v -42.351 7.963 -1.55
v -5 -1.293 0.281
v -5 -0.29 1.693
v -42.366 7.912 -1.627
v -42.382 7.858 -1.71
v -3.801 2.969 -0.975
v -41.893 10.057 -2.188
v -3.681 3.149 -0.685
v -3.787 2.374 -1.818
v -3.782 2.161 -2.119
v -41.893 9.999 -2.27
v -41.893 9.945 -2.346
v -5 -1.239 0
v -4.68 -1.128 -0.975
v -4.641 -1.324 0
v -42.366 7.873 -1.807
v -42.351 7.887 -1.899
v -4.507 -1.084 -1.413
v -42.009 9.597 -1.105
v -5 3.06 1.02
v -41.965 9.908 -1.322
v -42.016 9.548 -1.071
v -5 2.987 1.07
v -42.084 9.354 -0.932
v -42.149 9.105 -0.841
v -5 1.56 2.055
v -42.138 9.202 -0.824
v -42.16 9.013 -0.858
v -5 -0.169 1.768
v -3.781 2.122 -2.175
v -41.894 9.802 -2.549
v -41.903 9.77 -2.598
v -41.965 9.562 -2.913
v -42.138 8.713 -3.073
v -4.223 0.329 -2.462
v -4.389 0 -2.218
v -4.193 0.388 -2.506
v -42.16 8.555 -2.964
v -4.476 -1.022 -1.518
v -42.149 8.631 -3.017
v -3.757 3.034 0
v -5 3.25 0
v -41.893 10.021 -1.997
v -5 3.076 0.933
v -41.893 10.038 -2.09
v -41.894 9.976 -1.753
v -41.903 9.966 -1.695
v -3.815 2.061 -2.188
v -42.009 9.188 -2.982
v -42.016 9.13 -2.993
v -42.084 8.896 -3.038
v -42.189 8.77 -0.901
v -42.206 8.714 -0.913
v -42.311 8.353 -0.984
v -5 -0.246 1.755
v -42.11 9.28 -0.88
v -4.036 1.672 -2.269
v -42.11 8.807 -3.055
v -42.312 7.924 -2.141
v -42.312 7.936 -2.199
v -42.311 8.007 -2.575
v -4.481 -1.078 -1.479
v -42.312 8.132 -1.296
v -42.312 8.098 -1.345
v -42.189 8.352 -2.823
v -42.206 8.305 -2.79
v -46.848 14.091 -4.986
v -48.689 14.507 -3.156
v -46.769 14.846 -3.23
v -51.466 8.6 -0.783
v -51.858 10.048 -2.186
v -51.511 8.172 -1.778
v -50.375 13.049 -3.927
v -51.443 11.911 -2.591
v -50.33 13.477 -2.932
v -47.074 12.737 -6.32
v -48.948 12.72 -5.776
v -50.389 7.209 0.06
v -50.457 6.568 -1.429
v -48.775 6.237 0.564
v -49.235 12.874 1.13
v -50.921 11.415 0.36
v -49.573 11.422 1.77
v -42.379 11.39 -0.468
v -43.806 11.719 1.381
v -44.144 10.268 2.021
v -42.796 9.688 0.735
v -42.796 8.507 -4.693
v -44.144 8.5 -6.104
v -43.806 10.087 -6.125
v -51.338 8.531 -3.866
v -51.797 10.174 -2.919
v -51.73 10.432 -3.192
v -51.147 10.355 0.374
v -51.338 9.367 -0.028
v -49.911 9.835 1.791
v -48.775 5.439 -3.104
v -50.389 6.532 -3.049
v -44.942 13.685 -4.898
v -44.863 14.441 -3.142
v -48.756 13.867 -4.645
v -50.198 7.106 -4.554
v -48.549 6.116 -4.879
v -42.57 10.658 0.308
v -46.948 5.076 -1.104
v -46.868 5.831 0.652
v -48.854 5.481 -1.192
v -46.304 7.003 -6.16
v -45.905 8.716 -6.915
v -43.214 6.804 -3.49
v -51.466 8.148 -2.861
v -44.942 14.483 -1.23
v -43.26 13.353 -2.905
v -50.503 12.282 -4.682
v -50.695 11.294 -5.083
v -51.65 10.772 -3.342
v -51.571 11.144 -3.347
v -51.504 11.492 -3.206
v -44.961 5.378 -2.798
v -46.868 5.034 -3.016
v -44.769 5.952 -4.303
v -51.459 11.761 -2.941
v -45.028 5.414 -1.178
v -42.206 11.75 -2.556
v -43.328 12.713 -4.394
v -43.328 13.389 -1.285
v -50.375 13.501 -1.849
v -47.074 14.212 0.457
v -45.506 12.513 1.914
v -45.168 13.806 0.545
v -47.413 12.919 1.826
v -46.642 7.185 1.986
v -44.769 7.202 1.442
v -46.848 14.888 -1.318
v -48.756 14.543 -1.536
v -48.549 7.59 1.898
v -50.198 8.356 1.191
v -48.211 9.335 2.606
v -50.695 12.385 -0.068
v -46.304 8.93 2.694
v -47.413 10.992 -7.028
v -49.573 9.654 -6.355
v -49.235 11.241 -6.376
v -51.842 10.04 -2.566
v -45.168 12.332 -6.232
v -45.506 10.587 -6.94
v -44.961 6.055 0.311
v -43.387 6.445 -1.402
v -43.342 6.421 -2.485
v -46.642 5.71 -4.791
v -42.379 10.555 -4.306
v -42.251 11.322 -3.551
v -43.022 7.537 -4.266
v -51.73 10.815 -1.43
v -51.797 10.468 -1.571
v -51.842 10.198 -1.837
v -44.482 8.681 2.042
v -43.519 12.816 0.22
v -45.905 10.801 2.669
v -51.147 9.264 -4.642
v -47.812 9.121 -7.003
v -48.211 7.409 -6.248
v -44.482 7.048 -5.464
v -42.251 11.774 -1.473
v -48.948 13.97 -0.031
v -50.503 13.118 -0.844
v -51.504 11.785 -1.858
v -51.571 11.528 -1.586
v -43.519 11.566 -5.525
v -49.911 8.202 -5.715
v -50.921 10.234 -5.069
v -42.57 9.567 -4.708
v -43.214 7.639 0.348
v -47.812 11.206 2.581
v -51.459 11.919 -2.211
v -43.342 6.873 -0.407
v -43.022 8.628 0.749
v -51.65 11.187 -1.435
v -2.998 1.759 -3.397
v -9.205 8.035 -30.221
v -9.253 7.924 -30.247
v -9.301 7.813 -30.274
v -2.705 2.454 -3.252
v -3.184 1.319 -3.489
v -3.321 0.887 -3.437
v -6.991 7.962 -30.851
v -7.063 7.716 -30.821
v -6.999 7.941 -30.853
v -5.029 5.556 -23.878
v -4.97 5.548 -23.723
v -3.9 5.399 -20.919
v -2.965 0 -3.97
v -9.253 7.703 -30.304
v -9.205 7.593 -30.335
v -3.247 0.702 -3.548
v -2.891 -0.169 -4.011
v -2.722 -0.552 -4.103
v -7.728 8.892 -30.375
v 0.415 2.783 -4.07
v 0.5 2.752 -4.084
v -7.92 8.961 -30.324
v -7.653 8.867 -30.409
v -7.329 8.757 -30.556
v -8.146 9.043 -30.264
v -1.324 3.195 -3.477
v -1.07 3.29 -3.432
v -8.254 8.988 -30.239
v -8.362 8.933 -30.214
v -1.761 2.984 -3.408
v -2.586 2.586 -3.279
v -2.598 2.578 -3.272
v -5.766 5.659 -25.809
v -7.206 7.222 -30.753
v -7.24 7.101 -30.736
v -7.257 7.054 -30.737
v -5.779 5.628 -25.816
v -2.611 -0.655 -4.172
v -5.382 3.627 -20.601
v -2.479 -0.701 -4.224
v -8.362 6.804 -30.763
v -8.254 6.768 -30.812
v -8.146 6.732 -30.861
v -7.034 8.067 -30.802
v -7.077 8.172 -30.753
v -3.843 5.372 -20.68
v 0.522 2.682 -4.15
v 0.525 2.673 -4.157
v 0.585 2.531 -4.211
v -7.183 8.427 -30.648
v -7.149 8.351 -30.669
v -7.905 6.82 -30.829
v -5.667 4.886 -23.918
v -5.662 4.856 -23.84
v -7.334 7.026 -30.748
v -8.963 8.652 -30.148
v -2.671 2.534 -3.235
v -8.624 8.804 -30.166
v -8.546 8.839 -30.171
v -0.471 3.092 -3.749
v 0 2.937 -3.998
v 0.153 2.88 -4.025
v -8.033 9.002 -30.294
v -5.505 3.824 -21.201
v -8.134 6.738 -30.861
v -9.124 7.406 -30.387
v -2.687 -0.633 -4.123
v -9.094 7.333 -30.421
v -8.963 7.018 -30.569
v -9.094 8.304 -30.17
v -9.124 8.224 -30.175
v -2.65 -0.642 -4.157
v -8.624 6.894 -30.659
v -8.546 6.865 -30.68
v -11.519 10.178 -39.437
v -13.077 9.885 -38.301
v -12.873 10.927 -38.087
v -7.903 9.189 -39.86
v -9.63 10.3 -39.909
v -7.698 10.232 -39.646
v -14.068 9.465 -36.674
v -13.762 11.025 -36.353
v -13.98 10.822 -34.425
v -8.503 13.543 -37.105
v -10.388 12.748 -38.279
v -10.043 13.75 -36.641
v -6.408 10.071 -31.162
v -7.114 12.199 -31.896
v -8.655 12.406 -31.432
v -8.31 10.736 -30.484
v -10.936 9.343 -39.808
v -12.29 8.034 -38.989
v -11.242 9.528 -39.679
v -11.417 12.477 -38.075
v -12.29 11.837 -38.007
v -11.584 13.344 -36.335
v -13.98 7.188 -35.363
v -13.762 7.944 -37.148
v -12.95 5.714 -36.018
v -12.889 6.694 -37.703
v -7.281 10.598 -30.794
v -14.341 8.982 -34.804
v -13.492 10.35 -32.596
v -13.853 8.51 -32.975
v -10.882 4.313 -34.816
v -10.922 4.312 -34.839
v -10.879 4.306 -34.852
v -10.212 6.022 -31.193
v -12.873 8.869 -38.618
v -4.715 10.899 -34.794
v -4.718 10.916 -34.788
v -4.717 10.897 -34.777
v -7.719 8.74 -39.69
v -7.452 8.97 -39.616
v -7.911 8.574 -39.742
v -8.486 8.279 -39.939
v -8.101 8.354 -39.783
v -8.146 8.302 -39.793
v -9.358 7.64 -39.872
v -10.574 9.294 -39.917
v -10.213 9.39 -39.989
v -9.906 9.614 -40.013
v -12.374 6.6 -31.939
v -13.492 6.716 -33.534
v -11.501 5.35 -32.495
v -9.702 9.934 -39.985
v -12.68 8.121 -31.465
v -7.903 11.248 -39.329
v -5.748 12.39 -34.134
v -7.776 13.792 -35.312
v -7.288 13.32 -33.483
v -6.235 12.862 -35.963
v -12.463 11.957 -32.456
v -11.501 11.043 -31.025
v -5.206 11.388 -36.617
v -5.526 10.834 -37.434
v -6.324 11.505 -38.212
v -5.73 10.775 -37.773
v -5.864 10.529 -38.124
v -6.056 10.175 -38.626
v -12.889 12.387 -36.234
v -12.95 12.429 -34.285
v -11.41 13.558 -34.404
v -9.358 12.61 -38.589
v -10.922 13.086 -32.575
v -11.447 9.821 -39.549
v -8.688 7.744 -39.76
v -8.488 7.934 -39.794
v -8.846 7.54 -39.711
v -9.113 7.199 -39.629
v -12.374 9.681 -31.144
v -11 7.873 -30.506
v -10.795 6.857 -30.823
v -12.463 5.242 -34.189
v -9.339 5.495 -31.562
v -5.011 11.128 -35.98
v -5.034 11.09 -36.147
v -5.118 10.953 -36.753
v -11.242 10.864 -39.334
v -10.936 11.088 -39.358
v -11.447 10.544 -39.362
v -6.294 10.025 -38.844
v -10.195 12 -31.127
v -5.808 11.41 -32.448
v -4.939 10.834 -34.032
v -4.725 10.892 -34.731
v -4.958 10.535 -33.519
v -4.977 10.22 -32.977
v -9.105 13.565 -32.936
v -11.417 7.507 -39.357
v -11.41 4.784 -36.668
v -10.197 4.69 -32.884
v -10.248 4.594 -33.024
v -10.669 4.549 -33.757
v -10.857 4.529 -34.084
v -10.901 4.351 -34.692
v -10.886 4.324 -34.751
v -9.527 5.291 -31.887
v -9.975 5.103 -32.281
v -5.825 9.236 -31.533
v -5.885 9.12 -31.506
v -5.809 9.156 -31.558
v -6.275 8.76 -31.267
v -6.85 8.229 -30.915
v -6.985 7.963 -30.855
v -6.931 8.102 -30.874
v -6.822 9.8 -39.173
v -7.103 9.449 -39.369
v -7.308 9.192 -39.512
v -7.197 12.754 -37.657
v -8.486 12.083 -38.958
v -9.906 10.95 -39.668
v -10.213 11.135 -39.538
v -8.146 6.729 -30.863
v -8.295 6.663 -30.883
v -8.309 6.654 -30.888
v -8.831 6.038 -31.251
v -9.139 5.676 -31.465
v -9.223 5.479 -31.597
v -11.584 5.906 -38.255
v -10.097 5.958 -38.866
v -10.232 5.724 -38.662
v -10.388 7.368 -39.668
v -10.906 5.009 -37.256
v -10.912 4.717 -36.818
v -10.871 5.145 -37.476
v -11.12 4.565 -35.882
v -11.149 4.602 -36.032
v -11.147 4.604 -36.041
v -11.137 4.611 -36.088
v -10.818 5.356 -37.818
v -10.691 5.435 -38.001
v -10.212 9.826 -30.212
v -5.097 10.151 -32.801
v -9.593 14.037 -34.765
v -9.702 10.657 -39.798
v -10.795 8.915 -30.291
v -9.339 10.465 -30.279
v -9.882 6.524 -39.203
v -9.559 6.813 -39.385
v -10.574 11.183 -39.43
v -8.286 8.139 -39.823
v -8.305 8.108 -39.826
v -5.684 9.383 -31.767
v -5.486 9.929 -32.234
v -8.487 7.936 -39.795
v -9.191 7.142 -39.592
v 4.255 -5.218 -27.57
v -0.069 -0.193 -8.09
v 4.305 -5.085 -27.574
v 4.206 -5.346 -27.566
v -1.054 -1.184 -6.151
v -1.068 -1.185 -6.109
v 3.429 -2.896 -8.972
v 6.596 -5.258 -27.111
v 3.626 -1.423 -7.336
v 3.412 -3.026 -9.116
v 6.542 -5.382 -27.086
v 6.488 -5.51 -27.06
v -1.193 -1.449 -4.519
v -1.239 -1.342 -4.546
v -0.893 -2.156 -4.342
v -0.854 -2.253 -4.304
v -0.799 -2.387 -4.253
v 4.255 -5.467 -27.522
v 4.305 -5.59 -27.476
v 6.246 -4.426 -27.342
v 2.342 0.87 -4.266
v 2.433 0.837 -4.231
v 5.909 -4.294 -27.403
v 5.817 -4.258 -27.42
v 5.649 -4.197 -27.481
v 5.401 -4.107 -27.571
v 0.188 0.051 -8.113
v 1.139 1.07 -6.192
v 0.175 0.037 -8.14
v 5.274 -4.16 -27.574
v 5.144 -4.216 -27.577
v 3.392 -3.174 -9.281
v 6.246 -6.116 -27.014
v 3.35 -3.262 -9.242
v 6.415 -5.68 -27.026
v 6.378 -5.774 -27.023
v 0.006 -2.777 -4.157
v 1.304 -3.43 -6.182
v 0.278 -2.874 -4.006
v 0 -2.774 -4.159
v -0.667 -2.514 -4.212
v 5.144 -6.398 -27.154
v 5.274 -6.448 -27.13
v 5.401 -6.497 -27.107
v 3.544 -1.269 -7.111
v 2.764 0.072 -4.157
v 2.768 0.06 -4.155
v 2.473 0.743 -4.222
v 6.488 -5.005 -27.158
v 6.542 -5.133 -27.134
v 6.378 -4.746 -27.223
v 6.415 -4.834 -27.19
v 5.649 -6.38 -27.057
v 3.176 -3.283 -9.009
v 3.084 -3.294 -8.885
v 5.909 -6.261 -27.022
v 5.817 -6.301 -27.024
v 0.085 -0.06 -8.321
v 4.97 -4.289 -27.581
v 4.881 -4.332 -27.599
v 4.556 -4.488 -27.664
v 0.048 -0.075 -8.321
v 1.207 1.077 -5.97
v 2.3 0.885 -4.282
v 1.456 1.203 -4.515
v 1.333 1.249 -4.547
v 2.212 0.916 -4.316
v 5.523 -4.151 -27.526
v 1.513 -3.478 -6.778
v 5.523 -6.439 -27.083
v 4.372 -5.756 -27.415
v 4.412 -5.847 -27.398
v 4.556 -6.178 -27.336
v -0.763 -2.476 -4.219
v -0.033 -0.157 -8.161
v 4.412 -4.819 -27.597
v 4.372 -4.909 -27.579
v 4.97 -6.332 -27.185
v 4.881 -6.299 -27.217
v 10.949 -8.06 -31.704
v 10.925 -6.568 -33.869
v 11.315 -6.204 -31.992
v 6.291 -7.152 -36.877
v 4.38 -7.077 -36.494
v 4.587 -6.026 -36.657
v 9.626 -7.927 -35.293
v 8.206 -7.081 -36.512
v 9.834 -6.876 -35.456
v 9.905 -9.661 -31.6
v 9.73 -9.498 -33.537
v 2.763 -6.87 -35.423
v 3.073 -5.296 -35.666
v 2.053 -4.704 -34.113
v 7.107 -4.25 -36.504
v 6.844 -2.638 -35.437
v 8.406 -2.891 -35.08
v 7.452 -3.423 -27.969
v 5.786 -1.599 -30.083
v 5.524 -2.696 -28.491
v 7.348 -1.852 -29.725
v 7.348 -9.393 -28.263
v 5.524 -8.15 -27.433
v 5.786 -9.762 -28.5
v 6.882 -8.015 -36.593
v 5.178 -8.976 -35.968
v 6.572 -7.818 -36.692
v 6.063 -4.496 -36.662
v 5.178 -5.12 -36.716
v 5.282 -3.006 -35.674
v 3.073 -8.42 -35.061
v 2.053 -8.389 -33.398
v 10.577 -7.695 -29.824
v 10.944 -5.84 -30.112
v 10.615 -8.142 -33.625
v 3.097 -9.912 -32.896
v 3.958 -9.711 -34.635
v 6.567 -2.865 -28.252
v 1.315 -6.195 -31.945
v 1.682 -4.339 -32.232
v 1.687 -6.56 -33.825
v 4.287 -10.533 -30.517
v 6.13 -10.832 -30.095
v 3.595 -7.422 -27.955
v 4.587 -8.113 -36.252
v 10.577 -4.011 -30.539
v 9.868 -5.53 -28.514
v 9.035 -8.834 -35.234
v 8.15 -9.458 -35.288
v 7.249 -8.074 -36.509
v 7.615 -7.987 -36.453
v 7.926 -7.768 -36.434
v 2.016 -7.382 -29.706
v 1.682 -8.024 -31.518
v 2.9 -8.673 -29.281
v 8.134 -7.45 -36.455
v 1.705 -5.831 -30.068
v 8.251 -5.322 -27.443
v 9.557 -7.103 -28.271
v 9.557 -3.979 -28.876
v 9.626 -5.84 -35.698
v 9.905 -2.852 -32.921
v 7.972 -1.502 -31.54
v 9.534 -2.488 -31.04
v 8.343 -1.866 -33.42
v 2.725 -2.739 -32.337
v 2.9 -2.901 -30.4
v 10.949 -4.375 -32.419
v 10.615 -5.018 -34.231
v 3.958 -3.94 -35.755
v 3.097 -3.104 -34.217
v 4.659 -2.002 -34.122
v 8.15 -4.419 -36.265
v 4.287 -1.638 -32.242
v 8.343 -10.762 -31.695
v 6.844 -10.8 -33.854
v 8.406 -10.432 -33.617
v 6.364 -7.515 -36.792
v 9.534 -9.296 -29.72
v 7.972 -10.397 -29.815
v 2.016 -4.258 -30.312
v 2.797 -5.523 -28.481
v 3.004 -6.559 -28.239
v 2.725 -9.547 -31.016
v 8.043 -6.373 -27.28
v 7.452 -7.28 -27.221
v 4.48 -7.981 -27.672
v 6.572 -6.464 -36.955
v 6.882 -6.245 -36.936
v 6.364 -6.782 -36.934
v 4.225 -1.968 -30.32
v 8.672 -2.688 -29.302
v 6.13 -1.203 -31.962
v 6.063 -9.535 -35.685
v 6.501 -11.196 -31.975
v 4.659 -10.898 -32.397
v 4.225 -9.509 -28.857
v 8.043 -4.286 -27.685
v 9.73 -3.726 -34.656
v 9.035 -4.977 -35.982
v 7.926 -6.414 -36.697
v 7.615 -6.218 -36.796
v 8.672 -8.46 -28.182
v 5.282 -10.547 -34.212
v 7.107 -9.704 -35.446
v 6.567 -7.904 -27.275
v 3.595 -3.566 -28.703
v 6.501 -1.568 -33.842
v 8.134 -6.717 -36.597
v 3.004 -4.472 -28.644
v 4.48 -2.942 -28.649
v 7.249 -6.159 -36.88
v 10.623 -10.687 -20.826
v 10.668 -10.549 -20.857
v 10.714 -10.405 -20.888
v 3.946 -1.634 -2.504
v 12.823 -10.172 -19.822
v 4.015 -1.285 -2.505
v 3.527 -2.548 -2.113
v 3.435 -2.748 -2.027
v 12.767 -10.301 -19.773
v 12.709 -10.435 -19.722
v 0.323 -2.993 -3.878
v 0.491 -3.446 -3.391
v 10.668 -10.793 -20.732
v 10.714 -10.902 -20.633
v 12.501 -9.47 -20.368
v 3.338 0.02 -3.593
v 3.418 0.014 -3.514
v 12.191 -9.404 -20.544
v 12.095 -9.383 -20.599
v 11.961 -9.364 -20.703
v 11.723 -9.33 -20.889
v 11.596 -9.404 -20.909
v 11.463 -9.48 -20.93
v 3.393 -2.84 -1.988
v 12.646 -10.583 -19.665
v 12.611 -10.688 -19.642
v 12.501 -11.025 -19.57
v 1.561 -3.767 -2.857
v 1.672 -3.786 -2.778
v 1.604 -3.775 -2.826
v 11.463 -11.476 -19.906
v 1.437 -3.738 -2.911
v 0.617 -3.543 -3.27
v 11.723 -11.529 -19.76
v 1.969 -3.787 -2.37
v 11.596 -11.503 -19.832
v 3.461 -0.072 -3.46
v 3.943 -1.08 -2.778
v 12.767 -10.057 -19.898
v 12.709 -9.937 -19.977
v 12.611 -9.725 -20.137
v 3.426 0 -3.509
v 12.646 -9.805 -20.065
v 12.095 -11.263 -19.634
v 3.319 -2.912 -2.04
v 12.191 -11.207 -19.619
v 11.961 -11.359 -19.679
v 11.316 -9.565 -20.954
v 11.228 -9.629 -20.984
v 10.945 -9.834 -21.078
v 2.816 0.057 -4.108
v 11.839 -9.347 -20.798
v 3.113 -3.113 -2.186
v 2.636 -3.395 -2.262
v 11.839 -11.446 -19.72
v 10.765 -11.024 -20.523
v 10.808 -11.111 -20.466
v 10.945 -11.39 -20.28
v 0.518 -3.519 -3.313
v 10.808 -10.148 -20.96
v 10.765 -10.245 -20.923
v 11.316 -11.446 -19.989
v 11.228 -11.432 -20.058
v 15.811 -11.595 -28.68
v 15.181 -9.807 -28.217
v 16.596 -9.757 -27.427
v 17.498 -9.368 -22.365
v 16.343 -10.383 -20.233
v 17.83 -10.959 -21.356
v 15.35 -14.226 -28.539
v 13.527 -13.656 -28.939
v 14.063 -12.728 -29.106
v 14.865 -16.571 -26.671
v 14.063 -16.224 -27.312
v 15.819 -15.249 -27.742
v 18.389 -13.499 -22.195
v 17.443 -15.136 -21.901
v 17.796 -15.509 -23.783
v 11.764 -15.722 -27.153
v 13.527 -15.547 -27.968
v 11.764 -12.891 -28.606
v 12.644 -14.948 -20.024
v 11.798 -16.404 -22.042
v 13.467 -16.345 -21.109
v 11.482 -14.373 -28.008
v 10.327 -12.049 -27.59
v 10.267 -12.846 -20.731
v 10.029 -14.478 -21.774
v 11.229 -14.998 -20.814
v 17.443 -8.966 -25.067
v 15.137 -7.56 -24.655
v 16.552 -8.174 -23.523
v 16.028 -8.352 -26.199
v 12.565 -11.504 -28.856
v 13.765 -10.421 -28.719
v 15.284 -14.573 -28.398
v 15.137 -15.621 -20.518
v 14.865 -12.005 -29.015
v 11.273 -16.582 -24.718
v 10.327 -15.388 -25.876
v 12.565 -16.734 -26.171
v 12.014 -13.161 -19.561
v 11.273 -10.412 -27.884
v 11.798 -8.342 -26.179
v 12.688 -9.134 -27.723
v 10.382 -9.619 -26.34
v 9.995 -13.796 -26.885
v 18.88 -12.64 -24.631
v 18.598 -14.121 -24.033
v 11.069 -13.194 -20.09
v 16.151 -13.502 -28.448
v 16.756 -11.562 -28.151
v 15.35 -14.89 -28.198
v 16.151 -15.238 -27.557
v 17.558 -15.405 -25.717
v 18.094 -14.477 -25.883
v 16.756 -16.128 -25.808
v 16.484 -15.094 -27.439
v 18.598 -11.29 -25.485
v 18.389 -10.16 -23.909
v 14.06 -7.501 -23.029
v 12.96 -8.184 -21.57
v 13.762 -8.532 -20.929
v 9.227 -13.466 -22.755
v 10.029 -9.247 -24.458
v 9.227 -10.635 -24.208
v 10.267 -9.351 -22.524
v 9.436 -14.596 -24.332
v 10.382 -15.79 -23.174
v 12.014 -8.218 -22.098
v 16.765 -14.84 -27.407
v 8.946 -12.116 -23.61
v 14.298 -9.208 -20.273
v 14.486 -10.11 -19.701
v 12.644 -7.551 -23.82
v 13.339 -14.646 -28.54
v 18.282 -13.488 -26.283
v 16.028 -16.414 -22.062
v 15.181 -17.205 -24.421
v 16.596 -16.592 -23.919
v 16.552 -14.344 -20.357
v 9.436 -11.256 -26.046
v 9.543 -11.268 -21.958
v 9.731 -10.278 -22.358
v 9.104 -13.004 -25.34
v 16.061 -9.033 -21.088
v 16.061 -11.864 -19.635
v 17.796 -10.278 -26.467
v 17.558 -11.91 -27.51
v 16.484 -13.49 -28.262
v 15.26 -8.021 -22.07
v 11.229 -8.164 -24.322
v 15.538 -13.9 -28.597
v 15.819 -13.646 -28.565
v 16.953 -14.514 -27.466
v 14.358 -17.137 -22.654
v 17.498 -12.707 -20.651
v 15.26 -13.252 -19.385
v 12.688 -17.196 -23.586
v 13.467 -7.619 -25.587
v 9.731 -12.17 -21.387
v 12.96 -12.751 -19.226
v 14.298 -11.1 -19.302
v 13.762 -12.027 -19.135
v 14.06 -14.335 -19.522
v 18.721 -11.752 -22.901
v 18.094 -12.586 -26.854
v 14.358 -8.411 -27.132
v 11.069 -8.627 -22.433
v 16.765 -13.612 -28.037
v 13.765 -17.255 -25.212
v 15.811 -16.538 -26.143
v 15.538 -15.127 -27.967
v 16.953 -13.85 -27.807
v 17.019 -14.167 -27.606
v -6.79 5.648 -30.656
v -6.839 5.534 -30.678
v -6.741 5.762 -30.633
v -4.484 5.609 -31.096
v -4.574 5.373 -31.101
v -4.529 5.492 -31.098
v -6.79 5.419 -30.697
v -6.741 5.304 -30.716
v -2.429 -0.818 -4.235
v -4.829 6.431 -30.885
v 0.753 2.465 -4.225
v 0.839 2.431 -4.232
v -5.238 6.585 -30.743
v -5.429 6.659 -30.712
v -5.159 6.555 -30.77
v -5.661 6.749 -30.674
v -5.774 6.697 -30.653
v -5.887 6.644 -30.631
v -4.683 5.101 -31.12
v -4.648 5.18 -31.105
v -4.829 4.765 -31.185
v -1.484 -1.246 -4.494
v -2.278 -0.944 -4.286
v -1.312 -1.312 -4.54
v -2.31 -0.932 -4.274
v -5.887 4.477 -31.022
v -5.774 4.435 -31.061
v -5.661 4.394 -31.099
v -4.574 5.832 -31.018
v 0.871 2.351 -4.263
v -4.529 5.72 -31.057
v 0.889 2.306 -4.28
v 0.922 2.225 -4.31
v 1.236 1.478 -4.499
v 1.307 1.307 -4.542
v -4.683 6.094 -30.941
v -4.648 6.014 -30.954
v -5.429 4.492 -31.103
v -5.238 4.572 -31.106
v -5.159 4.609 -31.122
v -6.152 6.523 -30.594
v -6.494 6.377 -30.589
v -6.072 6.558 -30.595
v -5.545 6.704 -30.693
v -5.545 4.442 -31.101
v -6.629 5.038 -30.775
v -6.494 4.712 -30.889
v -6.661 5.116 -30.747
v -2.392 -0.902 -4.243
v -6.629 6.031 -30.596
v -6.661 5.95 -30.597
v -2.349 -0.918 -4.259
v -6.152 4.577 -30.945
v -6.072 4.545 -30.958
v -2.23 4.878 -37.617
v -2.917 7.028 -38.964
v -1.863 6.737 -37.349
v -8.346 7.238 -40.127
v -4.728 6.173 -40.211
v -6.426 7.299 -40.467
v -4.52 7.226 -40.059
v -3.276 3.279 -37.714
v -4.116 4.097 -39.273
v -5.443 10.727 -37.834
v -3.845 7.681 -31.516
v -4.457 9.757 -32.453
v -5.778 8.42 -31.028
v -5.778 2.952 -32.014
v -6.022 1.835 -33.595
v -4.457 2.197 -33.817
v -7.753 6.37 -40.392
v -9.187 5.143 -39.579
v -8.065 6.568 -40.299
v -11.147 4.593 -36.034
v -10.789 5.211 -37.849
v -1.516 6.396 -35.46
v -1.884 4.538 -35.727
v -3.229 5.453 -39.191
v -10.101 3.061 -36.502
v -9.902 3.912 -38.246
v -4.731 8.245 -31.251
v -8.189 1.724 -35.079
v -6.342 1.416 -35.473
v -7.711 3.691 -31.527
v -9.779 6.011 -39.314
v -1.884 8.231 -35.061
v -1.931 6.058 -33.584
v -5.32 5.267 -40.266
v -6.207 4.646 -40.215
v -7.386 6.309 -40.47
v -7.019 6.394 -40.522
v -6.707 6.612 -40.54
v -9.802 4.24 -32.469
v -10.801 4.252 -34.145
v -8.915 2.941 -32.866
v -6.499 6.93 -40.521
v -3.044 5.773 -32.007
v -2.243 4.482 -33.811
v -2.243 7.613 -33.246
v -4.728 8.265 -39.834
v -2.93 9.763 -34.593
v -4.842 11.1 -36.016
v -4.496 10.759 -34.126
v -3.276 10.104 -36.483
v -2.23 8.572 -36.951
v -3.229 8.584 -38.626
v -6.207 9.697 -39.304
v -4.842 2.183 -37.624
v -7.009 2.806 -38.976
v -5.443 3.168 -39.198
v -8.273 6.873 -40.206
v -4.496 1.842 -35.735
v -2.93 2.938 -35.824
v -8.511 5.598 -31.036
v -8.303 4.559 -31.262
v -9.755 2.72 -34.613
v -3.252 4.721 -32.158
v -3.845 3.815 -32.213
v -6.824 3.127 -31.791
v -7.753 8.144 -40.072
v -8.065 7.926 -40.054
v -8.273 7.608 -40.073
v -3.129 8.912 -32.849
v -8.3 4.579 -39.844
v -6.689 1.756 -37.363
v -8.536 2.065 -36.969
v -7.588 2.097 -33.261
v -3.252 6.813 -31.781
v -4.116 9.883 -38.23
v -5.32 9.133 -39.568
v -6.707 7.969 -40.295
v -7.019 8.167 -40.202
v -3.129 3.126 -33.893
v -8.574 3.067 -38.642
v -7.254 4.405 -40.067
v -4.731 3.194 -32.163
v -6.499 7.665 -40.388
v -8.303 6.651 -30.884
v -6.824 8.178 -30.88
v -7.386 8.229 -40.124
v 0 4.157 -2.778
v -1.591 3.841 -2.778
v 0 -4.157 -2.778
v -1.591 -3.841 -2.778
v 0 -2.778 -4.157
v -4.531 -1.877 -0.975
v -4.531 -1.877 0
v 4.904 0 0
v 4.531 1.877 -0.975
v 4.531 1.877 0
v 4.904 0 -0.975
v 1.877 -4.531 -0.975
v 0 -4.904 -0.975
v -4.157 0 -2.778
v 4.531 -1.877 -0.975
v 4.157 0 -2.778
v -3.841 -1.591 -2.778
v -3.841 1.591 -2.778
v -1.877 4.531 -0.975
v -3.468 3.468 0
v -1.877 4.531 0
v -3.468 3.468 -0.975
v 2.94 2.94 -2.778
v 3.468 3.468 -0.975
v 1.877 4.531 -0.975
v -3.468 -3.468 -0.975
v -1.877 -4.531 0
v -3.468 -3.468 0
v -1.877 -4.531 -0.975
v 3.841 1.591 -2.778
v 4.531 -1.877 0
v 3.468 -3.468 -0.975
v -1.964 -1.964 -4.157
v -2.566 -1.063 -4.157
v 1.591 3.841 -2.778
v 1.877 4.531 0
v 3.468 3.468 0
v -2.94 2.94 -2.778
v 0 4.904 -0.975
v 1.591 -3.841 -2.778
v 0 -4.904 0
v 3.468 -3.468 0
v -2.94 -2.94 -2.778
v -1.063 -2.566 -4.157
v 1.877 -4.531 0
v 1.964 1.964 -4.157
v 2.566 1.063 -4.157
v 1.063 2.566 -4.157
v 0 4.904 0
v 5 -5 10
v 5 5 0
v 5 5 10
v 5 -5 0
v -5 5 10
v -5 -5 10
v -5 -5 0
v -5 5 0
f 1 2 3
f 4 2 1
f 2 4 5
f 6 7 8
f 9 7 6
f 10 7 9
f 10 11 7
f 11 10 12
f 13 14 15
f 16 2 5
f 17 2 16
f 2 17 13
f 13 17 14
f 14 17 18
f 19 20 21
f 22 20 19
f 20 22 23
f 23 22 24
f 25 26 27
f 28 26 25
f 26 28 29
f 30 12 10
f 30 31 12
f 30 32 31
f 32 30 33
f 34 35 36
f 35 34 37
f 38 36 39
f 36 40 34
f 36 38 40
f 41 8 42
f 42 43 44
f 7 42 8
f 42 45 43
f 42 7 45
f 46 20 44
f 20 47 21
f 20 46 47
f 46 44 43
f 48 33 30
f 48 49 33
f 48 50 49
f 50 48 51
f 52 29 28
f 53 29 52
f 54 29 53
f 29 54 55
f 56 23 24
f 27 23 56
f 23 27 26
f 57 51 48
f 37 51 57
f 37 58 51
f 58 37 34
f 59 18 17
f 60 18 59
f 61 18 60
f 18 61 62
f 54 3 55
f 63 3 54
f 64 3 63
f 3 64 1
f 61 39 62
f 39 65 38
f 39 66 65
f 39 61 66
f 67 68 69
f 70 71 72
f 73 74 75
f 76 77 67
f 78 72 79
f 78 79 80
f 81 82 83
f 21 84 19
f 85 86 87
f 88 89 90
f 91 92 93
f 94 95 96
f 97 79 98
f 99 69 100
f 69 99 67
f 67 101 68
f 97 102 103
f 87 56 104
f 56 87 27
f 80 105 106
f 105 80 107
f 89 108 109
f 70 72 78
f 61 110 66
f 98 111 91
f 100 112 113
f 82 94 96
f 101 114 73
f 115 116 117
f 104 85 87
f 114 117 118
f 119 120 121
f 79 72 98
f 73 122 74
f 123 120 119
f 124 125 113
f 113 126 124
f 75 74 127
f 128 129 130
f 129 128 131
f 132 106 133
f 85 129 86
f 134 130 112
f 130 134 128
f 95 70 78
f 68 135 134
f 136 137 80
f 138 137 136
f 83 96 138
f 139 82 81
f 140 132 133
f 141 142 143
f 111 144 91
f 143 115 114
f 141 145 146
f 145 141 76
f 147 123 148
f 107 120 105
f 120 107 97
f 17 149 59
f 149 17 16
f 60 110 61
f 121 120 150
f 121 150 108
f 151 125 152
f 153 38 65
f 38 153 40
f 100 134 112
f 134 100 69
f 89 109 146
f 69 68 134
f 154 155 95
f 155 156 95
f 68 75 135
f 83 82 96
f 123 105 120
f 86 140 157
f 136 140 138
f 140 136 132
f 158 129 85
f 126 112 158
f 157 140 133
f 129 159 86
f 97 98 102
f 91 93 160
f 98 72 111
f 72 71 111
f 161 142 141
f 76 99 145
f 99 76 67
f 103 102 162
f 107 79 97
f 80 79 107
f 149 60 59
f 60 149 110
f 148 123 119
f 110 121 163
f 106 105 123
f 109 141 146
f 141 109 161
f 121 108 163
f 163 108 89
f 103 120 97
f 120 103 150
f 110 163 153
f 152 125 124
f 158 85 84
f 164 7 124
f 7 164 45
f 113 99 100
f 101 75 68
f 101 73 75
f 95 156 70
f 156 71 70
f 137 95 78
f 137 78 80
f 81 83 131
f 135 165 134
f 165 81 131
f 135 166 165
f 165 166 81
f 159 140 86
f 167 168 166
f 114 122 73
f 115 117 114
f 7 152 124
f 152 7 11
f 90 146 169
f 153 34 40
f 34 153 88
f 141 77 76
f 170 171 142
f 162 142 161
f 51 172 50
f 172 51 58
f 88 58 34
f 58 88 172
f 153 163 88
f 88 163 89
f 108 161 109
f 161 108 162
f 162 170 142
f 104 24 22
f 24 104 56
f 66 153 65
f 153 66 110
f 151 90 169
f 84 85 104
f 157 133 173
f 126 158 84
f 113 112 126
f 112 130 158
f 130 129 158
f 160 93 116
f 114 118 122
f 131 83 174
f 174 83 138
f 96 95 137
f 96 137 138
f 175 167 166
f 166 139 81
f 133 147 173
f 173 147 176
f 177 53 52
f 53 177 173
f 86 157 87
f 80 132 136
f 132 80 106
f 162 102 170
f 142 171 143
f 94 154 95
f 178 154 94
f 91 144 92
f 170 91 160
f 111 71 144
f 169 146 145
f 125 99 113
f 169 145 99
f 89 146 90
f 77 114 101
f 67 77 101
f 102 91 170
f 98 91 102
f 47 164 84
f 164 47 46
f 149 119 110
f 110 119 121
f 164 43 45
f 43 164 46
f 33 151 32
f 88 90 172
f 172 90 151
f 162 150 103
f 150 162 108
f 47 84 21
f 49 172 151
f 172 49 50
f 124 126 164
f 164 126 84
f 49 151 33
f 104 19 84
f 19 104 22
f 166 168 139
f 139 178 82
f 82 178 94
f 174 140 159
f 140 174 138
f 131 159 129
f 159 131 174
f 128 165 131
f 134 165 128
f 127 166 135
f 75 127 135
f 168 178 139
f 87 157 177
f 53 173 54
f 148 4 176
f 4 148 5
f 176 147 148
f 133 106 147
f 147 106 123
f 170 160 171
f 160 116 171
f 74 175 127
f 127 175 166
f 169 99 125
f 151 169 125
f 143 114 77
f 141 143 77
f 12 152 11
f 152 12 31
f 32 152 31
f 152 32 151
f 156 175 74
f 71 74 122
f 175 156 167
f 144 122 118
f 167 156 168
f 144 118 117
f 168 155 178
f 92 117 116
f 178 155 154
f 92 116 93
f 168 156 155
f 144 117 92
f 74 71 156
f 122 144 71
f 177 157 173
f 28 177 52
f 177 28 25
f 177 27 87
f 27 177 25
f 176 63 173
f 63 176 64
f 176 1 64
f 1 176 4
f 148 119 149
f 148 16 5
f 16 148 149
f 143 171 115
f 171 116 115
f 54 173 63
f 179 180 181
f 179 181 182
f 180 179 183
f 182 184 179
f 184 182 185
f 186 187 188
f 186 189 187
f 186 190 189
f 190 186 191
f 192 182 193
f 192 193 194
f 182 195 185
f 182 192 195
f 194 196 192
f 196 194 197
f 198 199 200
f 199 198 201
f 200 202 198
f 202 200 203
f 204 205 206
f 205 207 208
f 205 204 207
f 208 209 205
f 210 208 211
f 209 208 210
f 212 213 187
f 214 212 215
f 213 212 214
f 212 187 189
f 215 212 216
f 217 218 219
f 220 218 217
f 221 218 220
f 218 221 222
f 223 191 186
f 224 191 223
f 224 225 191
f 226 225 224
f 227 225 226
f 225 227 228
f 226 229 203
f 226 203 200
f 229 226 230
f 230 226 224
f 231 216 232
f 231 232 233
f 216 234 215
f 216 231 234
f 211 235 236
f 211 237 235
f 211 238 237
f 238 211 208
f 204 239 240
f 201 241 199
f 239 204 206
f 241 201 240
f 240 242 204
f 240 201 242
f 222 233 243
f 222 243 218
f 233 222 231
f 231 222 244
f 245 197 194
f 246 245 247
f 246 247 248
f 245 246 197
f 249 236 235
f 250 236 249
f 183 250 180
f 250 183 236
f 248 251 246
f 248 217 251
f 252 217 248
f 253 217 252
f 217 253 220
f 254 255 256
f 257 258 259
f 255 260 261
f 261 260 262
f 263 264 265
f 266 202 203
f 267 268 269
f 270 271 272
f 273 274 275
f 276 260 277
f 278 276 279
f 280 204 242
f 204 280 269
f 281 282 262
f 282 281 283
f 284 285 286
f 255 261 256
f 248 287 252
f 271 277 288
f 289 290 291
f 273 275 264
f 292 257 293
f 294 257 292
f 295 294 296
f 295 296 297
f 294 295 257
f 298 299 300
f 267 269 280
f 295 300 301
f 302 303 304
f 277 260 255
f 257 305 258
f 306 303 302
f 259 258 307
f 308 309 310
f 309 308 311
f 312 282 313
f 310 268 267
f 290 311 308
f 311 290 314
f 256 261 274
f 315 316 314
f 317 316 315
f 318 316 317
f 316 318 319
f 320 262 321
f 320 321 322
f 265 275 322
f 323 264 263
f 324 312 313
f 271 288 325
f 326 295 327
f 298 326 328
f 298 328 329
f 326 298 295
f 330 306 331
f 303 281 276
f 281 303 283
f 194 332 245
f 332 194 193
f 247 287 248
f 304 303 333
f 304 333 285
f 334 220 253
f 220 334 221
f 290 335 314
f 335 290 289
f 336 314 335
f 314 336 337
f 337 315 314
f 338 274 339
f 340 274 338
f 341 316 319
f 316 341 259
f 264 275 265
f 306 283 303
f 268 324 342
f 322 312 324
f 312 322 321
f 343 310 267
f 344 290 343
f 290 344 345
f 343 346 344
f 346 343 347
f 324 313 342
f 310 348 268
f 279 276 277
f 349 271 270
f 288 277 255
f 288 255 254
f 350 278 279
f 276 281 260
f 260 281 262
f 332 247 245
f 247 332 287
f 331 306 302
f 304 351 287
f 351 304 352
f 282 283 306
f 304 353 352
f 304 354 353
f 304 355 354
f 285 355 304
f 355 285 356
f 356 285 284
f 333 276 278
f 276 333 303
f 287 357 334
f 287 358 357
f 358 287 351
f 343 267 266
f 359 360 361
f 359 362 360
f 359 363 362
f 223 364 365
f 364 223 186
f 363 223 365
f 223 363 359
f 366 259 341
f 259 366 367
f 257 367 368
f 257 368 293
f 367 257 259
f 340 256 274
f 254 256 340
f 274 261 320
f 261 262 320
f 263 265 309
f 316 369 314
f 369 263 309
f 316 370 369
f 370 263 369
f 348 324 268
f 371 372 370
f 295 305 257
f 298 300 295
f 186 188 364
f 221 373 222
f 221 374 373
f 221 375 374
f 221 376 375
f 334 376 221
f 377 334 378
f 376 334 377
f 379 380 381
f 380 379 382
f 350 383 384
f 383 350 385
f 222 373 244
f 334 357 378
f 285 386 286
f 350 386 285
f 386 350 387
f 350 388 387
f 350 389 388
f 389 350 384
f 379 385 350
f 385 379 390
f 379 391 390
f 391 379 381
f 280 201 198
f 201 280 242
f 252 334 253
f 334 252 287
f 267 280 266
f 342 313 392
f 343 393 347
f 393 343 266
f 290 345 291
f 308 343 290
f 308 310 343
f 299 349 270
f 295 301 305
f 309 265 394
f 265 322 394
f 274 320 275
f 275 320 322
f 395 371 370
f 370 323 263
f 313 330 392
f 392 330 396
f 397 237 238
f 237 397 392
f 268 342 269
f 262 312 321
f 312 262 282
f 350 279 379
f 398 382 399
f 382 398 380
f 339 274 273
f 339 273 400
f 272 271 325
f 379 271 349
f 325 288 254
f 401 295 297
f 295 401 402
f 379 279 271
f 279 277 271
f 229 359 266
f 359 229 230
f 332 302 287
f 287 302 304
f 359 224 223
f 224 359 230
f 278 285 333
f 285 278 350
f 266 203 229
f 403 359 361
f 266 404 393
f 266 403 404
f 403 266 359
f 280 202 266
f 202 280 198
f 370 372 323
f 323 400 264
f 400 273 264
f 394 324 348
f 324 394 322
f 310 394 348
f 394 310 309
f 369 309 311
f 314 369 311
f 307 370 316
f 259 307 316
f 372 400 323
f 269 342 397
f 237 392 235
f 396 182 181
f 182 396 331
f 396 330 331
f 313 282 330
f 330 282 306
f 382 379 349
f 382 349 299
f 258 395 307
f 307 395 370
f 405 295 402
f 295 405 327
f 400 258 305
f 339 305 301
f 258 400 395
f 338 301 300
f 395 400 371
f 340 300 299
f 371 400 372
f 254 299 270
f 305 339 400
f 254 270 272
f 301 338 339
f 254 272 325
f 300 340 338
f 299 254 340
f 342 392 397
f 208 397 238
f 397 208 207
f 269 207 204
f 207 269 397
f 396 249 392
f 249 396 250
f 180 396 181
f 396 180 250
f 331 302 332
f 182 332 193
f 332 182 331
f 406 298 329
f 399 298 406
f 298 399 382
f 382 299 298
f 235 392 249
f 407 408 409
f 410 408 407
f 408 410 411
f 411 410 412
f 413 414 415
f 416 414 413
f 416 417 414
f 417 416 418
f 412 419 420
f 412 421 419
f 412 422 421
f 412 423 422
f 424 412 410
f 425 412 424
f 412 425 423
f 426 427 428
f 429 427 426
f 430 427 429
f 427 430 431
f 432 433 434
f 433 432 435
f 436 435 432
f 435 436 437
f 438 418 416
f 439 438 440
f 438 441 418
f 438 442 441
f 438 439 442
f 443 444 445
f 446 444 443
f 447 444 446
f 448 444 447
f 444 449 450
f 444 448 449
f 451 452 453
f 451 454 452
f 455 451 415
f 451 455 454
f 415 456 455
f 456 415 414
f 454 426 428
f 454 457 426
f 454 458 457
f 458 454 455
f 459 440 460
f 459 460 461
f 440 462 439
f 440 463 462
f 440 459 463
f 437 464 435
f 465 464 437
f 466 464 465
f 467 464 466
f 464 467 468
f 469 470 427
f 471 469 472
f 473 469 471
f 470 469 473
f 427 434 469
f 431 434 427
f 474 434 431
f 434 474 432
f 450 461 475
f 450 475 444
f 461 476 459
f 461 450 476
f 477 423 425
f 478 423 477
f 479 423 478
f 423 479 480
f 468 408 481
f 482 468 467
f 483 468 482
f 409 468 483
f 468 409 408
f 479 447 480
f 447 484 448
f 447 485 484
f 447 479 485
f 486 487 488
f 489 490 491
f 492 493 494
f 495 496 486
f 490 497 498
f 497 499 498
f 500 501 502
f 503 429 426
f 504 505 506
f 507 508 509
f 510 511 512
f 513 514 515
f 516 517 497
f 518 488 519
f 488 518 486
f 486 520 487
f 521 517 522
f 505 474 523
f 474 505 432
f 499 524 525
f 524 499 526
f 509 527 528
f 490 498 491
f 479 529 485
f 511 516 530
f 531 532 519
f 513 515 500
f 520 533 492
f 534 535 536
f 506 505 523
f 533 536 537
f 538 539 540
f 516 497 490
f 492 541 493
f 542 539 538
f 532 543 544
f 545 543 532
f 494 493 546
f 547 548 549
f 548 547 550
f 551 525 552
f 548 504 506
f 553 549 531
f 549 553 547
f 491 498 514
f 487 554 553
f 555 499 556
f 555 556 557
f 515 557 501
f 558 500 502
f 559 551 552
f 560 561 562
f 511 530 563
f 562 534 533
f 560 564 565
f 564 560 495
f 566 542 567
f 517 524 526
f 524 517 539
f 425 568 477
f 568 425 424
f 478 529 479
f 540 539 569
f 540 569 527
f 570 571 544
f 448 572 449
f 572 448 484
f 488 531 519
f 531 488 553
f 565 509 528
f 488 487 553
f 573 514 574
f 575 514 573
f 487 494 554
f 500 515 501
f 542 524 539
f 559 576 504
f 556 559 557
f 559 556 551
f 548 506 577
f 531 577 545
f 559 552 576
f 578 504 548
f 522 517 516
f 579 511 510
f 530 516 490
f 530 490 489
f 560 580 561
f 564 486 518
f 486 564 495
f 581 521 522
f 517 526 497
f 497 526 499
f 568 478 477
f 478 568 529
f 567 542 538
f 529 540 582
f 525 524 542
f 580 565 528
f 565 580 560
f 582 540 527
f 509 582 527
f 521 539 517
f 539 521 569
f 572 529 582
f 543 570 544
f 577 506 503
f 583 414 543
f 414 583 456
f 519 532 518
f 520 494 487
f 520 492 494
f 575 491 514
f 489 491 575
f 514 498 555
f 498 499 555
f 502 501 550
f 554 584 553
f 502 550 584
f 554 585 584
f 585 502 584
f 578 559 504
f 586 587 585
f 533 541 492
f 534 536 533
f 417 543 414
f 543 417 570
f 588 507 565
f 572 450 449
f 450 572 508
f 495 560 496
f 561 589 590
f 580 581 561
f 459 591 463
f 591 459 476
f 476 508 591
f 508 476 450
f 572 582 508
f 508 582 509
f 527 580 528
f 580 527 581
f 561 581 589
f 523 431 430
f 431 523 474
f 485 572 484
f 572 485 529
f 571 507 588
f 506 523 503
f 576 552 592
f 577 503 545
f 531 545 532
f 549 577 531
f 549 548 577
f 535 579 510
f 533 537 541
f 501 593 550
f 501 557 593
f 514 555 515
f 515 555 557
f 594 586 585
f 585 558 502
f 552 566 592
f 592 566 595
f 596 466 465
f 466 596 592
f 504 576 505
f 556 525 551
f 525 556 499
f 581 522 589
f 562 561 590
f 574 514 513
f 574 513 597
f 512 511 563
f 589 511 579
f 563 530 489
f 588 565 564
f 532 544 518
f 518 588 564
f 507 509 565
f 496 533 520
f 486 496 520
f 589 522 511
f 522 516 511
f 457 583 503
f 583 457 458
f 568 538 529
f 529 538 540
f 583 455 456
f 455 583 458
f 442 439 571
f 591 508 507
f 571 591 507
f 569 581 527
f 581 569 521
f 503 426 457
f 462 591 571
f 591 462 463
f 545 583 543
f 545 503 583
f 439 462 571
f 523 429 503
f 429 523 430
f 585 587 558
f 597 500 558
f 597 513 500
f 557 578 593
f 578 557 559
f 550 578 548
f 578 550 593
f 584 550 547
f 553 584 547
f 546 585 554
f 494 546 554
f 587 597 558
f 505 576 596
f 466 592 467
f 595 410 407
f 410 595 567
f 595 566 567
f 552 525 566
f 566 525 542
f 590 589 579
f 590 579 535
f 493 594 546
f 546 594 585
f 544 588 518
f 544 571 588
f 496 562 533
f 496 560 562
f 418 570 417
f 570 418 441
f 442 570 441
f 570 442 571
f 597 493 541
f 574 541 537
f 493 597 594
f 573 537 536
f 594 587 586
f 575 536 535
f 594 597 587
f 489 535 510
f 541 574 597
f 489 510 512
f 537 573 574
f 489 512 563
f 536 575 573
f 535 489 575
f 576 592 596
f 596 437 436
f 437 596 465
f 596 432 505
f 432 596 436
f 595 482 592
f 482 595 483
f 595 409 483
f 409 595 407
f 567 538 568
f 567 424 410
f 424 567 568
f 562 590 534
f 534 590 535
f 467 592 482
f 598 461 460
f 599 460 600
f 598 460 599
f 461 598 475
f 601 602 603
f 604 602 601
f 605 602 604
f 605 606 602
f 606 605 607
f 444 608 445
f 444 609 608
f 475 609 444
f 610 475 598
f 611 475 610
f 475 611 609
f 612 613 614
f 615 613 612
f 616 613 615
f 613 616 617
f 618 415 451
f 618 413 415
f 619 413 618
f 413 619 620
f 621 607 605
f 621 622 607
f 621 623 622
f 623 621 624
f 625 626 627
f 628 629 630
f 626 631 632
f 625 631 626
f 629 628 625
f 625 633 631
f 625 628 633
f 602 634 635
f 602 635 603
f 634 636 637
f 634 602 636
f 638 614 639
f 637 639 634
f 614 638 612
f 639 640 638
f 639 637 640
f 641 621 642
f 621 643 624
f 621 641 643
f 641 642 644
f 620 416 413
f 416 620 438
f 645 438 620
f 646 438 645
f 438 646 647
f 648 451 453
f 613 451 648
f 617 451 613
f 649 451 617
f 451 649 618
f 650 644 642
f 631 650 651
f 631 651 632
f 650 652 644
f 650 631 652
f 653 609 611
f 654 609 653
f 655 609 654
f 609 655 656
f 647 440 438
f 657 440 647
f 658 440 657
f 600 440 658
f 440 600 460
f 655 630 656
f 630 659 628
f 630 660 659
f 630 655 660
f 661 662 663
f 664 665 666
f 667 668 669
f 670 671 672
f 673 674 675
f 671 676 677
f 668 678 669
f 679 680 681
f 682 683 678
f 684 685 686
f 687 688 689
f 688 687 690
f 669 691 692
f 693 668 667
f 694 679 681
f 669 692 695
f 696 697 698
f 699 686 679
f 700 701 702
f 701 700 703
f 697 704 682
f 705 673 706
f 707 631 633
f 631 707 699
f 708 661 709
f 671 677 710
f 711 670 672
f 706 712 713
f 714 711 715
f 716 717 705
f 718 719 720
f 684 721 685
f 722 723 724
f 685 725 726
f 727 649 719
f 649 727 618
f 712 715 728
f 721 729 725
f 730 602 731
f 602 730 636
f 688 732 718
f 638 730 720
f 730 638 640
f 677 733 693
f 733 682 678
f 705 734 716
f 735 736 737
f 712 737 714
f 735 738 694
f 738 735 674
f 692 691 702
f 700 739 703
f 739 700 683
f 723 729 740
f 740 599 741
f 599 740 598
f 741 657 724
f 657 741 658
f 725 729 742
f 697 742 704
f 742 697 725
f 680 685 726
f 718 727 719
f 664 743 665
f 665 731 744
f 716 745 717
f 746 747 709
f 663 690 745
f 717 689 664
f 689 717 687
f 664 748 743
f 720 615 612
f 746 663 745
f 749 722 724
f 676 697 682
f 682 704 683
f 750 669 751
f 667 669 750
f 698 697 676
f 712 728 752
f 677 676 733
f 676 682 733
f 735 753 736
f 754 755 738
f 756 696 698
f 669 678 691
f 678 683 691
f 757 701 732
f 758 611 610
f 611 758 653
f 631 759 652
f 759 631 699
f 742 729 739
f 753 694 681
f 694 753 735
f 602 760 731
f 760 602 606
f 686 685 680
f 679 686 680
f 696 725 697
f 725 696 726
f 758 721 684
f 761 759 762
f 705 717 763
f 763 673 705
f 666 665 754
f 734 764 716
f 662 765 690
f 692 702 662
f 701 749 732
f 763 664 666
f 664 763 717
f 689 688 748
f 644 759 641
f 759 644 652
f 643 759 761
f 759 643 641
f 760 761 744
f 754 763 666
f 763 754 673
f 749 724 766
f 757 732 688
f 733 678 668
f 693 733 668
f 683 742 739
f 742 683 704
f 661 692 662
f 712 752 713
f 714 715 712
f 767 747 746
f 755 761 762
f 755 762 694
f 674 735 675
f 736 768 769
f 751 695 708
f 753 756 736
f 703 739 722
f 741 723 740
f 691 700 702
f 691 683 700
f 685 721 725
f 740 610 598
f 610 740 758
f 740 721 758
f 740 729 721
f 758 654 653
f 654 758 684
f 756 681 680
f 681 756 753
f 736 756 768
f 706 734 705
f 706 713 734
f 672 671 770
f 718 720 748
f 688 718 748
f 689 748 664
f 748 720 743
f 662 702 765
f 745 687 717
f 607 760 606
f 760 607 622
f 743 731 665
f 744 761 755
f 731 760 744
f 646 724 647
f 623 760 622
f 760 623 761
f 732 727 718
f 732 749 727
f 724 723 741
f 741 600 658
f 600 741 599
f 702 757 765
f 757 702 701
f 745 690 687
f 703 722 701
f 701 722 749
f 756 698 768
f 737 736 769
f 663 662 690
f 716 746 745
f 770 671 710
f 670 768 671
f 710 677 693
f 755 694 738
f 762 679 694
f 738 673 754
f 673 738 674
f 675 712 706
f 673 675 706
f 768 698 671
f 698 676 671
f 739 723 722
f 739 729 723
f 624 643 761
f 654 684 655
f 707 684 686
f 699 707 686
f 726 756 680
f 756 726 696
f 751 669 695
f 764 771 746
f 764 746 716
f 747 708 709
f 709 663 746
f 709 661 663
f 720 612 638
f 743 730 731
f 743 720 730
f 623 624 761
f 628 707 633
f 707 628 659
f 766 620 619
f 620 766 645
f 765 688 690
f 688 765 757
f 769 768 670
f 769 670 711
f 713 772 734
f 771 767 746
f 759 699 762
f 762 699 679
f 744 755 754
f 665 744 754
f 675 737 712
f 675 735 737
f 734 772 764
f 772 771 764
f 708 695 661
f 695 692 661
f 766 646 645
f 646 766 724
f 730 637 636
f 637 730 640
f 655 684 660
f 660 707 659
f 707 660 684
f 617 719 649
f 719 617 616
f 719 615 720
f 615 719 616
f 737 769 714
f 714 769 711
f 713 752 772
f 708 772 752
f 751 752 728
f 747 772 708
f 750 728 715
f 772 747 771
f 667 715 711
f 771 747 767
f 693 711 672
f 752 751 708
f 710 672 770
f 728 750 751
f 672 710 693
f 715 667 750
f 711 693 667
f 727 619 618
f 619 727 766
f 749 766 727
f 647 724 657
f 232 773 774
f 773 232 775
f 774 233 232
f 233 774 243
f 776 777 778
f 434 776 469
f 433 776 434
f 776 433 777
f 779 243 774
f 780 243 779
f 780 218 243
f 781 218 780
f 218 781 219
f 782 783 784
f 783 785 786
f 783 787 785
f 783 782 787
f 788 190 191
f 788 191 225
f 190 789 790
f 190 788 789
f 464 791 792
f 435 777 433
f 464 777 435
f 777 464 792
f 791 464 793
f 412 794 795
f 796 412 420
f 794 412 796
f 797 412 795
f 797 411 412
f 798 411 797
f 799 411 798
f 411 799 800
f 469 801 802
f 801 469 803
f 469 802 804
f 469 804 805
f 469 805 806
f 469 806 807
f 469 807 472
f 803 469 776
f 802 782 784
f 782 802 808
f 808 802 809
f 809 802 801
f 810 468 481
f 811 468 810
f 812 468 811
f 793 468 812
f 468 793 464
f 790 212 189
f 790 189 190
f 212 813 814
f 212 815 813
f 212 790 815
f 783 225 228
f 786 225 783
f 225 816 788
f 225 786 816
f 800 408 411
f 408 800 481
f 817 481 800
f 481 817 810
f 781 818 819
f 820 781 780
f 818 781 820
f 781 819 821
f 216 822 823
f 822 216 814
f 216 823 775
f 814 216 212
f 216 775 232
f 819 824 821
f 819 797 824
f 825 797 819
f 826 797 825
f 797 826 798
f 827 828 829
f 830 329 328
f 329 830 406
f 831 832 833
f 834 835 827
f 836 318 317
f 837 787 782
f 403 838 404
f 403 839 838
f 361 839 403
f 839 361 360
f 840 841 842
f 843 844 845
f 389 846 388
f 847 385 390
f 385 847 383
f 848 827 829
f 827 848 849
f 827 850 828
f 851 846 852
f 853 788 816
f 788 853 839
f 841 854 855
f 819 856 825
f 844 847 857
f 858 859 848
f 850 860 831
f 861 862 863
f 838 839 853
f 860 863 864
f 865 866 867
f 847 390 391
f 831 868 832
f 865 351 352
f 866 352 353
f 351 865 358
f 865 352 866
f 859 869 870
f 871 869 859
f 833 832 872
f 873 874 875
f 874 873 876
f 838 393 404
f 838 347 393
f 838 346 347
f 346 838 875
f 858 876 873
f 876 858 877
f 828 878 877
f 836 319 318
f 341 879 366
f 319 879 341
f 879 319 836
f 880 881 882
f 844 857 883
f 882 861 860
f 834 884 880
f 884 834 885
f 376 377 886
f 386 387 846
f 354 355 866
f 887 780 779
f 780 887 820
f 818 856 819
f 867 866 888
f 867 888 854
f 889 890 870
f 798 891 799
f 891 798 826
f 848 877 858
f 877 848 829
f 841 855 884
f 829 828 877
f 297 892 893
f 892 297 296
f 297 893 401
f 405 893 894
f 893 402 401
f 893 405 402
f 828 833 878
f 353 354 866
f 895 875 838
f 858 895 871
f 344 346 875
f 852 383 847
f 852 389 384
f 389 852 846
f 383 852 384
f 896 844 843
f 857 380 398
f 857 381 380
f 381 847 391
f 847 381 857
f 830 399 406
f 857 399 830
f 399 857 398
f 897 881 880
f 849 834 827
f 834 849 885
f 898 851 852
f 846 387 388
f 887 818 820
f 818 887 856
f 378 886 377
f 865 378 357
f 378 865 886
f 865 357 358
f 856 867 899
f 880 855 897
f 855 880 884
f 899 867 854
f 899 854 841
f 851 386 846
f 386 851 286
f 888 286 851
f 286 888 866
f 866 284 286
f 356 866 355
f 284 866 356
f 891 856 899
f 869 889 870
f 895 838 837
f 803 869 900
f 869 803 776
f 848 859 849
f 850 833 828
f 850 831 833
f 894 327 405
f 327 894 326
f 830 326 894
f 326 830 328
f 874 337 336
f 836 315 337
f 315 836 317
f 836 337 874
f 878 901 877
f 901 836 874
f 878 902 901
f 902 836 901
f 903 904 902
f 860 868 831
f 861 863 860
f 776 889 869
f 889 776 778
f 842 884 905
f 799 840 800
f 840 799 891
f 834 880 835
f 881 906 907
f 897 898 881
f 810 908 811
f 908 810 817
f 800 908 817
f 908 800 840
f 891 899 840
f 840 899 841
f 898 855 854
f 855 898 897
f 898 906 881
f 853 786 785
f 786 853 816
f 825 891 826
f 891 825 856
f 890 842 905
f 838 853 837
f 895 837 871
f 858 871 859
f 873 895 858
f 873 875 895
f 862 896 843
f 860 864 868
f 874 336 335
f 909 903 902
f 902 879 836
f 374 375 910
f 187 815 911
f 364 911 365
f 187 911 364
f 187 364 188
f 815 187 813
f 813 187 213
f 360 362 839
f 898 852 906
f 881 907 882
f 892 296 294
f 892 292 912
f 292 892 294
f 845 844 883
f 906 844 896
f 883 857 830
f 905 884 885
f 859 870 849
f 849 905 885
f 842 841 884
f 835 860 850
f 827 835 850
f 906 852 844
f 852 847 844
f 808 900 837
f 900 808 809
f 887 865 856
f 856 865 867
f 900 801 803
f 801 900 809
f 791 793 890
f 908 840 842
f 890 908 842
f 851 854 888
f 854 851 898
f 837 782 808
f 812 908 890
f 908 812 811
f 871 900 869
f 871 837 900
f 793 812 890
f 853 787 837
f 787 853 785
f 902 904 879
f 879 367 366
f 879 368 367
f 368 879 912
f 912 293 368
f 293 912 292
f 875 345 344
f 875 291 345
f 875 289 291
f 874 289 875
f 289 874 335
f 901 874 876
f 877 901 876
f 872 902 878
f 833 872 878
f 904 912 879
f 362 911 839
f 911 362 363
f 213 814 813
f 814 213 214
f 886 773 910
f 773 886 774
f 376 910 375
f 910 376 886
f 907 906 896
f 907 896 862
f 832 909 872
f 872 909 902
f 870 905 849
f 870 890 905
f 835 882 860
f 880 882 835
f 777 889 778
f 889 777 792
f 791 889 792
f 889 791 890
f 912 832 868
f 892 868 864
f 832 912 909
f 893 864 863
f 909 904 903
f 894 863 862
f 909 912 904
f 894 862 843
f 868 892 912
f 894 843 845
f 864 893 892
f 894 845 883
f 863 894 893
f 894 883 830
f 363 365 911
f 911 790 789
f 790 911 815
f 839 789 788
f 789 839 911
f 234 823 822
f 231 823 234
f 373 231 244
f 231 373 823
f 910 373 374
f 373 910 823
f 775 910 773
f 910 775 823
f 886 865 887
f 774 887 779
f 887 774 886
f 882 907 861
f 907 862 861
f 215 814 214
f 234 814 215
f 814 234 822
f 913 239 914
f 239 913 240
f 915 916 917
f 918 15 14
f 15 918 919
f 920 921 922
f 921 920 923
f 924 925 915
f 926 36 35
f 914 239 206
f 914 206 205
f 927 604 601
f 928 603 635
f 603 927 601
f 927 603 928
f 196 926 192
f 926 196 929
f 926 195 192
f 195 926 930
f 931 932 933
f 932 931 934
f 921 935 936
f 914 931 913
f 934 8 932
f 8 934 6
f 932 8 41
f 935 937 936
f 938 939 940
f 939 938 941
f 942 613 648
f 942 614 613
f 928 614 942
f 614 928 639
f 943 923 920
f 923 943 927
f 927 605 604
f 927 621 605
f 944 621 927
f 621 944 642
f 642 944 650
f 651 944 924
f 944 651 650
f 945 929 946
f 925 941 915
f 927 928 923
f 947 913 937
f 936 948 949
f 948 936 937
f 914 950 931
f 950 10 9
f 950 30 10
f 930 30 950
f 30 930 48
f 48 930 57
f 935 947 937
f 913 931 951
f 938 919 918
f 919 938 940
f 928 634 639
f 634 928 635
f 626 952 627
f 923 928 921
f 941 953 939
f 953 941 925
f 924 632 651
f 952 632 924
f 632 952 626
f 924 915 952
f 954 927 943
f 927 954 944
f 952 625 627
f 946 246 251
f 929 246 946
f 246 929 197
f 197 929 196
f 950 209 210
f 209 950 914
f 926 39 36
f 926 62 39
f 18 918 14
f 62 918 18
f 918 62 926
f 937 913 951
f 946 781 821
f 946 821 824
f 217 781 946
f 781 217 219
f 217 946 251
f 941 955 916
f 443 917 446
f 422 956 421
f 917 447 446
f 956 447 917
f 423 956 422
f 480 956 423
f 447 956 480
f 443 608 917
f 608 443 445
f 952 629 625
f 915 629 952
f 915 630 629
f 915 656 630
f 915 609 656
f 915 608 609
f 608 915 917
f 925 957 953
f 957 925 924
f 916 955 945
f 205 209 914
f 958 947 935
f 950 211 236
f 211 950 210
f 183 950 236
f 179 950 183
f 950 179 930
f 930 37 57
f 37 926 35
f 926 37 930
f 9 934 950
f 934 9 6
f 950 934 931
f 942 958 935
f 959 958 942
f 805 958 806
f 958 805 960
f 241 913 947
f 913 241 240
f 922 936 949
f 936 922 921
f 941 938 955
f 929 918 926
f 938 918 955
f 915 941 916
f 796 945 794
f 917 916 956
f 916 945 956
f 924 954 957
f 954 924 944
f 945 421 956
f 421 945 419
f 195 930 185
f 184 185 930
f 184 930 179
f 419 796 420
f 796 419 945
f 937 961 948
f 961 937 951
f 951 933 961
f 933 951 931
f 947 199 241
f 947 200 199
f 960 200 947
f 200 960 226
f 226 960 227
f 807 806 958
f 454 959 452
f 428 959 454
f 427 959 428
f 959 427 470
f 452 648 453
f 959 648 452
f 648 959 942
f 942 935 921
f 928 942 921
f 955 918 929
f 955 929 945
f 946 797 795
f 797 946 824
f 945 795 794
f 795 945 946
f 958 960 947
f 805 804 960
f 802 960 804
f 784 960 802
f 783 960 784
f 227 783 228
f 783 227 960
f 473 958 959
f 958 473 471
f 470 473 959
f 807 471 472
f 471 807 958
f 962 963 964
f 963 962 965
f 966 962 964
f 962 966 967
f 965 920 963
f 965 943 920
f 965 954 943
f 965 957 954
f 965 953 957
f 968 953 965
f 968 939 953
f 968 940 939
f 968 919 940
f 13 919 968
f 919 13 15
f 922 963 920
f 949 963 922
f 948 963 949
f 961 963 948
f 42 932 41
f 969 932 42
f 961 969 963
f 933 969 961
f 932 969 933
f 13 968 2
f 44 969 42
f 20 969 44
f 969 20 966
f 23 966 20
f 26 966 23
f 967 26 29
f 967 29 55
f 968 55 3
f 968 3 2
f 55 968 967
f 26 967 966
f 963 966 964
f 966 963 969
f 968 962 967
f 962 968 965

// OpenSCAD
// [FL_INDEX: keywords="openscad, 3d_parametric, Custom_OptiTrack_Markers, csg_solid" | COT="Parametric OpenSCAD design from 3DCodeverse"]
// Title: Custom OptiTrack Markers

//	Custom OptiTrack Marker Generator
// (c) James Walsh - james.walsh@setoreaustralia.com
// Original concept and prototype by Bruce Thomas (http://www.unisanet.unisa.edu.au/Staff/Homepage.asp?Name=Bruce.Thomas)

//CUSTOMIZER VARIABLES

//	Stand Width (X) (mm)
x_measurement = 10;

//	Stand Width (Y) (mm)
y_measurement = 10;

//	Stand Height (mm)
z_measurement = 10;

//	Marker Diameter (mm)
diameter = 10;	//	[5:40]

//	Number of Markers
marker_count = 5;	//	[1:5]

//	Max Marker Distance from Center
max_length = 7;	//	[5:15]

//Marker ID (Random Seed to Generate Marker)
seed = 150; // [0 : 300]

//CUSTOMIZER VARIABLES END

//core stand
translate([0,0,z_measurement/2]) cube([x_measurement, y_measurement, z_measurement], center=true);

//random marker offsets
rotX = rands(0, 180, marker_count, seed);
rotY = rands(0, 180, marker_count, seed);
rotZ = rands(0, 360, marker_count, seed);
lengthR = rands(diameter * 2, max(diameter * 5, max_length), marker_count, seed);

//draw the markers
for (i = [0 : marker_count])
{
	markerOnAStick(rotX[i] - 90, rotY[i] + 90, rotZ[i], lengthR[i], diameter);
}

module markerOnAStick(rotX, rotY, rotZ, length, diameter)
{
	rotate(rotX, [1, 0, 0])
	{
		rotate(rotY, [0, 1, 0])
		{
			rotate(0 , [0, 0, 1])
			{
				cylinder(length, diameter / 4);
				translate([0,0,length]) 
				{
					sphere(diameter / 2);
				}
			}
		}
	}
}
